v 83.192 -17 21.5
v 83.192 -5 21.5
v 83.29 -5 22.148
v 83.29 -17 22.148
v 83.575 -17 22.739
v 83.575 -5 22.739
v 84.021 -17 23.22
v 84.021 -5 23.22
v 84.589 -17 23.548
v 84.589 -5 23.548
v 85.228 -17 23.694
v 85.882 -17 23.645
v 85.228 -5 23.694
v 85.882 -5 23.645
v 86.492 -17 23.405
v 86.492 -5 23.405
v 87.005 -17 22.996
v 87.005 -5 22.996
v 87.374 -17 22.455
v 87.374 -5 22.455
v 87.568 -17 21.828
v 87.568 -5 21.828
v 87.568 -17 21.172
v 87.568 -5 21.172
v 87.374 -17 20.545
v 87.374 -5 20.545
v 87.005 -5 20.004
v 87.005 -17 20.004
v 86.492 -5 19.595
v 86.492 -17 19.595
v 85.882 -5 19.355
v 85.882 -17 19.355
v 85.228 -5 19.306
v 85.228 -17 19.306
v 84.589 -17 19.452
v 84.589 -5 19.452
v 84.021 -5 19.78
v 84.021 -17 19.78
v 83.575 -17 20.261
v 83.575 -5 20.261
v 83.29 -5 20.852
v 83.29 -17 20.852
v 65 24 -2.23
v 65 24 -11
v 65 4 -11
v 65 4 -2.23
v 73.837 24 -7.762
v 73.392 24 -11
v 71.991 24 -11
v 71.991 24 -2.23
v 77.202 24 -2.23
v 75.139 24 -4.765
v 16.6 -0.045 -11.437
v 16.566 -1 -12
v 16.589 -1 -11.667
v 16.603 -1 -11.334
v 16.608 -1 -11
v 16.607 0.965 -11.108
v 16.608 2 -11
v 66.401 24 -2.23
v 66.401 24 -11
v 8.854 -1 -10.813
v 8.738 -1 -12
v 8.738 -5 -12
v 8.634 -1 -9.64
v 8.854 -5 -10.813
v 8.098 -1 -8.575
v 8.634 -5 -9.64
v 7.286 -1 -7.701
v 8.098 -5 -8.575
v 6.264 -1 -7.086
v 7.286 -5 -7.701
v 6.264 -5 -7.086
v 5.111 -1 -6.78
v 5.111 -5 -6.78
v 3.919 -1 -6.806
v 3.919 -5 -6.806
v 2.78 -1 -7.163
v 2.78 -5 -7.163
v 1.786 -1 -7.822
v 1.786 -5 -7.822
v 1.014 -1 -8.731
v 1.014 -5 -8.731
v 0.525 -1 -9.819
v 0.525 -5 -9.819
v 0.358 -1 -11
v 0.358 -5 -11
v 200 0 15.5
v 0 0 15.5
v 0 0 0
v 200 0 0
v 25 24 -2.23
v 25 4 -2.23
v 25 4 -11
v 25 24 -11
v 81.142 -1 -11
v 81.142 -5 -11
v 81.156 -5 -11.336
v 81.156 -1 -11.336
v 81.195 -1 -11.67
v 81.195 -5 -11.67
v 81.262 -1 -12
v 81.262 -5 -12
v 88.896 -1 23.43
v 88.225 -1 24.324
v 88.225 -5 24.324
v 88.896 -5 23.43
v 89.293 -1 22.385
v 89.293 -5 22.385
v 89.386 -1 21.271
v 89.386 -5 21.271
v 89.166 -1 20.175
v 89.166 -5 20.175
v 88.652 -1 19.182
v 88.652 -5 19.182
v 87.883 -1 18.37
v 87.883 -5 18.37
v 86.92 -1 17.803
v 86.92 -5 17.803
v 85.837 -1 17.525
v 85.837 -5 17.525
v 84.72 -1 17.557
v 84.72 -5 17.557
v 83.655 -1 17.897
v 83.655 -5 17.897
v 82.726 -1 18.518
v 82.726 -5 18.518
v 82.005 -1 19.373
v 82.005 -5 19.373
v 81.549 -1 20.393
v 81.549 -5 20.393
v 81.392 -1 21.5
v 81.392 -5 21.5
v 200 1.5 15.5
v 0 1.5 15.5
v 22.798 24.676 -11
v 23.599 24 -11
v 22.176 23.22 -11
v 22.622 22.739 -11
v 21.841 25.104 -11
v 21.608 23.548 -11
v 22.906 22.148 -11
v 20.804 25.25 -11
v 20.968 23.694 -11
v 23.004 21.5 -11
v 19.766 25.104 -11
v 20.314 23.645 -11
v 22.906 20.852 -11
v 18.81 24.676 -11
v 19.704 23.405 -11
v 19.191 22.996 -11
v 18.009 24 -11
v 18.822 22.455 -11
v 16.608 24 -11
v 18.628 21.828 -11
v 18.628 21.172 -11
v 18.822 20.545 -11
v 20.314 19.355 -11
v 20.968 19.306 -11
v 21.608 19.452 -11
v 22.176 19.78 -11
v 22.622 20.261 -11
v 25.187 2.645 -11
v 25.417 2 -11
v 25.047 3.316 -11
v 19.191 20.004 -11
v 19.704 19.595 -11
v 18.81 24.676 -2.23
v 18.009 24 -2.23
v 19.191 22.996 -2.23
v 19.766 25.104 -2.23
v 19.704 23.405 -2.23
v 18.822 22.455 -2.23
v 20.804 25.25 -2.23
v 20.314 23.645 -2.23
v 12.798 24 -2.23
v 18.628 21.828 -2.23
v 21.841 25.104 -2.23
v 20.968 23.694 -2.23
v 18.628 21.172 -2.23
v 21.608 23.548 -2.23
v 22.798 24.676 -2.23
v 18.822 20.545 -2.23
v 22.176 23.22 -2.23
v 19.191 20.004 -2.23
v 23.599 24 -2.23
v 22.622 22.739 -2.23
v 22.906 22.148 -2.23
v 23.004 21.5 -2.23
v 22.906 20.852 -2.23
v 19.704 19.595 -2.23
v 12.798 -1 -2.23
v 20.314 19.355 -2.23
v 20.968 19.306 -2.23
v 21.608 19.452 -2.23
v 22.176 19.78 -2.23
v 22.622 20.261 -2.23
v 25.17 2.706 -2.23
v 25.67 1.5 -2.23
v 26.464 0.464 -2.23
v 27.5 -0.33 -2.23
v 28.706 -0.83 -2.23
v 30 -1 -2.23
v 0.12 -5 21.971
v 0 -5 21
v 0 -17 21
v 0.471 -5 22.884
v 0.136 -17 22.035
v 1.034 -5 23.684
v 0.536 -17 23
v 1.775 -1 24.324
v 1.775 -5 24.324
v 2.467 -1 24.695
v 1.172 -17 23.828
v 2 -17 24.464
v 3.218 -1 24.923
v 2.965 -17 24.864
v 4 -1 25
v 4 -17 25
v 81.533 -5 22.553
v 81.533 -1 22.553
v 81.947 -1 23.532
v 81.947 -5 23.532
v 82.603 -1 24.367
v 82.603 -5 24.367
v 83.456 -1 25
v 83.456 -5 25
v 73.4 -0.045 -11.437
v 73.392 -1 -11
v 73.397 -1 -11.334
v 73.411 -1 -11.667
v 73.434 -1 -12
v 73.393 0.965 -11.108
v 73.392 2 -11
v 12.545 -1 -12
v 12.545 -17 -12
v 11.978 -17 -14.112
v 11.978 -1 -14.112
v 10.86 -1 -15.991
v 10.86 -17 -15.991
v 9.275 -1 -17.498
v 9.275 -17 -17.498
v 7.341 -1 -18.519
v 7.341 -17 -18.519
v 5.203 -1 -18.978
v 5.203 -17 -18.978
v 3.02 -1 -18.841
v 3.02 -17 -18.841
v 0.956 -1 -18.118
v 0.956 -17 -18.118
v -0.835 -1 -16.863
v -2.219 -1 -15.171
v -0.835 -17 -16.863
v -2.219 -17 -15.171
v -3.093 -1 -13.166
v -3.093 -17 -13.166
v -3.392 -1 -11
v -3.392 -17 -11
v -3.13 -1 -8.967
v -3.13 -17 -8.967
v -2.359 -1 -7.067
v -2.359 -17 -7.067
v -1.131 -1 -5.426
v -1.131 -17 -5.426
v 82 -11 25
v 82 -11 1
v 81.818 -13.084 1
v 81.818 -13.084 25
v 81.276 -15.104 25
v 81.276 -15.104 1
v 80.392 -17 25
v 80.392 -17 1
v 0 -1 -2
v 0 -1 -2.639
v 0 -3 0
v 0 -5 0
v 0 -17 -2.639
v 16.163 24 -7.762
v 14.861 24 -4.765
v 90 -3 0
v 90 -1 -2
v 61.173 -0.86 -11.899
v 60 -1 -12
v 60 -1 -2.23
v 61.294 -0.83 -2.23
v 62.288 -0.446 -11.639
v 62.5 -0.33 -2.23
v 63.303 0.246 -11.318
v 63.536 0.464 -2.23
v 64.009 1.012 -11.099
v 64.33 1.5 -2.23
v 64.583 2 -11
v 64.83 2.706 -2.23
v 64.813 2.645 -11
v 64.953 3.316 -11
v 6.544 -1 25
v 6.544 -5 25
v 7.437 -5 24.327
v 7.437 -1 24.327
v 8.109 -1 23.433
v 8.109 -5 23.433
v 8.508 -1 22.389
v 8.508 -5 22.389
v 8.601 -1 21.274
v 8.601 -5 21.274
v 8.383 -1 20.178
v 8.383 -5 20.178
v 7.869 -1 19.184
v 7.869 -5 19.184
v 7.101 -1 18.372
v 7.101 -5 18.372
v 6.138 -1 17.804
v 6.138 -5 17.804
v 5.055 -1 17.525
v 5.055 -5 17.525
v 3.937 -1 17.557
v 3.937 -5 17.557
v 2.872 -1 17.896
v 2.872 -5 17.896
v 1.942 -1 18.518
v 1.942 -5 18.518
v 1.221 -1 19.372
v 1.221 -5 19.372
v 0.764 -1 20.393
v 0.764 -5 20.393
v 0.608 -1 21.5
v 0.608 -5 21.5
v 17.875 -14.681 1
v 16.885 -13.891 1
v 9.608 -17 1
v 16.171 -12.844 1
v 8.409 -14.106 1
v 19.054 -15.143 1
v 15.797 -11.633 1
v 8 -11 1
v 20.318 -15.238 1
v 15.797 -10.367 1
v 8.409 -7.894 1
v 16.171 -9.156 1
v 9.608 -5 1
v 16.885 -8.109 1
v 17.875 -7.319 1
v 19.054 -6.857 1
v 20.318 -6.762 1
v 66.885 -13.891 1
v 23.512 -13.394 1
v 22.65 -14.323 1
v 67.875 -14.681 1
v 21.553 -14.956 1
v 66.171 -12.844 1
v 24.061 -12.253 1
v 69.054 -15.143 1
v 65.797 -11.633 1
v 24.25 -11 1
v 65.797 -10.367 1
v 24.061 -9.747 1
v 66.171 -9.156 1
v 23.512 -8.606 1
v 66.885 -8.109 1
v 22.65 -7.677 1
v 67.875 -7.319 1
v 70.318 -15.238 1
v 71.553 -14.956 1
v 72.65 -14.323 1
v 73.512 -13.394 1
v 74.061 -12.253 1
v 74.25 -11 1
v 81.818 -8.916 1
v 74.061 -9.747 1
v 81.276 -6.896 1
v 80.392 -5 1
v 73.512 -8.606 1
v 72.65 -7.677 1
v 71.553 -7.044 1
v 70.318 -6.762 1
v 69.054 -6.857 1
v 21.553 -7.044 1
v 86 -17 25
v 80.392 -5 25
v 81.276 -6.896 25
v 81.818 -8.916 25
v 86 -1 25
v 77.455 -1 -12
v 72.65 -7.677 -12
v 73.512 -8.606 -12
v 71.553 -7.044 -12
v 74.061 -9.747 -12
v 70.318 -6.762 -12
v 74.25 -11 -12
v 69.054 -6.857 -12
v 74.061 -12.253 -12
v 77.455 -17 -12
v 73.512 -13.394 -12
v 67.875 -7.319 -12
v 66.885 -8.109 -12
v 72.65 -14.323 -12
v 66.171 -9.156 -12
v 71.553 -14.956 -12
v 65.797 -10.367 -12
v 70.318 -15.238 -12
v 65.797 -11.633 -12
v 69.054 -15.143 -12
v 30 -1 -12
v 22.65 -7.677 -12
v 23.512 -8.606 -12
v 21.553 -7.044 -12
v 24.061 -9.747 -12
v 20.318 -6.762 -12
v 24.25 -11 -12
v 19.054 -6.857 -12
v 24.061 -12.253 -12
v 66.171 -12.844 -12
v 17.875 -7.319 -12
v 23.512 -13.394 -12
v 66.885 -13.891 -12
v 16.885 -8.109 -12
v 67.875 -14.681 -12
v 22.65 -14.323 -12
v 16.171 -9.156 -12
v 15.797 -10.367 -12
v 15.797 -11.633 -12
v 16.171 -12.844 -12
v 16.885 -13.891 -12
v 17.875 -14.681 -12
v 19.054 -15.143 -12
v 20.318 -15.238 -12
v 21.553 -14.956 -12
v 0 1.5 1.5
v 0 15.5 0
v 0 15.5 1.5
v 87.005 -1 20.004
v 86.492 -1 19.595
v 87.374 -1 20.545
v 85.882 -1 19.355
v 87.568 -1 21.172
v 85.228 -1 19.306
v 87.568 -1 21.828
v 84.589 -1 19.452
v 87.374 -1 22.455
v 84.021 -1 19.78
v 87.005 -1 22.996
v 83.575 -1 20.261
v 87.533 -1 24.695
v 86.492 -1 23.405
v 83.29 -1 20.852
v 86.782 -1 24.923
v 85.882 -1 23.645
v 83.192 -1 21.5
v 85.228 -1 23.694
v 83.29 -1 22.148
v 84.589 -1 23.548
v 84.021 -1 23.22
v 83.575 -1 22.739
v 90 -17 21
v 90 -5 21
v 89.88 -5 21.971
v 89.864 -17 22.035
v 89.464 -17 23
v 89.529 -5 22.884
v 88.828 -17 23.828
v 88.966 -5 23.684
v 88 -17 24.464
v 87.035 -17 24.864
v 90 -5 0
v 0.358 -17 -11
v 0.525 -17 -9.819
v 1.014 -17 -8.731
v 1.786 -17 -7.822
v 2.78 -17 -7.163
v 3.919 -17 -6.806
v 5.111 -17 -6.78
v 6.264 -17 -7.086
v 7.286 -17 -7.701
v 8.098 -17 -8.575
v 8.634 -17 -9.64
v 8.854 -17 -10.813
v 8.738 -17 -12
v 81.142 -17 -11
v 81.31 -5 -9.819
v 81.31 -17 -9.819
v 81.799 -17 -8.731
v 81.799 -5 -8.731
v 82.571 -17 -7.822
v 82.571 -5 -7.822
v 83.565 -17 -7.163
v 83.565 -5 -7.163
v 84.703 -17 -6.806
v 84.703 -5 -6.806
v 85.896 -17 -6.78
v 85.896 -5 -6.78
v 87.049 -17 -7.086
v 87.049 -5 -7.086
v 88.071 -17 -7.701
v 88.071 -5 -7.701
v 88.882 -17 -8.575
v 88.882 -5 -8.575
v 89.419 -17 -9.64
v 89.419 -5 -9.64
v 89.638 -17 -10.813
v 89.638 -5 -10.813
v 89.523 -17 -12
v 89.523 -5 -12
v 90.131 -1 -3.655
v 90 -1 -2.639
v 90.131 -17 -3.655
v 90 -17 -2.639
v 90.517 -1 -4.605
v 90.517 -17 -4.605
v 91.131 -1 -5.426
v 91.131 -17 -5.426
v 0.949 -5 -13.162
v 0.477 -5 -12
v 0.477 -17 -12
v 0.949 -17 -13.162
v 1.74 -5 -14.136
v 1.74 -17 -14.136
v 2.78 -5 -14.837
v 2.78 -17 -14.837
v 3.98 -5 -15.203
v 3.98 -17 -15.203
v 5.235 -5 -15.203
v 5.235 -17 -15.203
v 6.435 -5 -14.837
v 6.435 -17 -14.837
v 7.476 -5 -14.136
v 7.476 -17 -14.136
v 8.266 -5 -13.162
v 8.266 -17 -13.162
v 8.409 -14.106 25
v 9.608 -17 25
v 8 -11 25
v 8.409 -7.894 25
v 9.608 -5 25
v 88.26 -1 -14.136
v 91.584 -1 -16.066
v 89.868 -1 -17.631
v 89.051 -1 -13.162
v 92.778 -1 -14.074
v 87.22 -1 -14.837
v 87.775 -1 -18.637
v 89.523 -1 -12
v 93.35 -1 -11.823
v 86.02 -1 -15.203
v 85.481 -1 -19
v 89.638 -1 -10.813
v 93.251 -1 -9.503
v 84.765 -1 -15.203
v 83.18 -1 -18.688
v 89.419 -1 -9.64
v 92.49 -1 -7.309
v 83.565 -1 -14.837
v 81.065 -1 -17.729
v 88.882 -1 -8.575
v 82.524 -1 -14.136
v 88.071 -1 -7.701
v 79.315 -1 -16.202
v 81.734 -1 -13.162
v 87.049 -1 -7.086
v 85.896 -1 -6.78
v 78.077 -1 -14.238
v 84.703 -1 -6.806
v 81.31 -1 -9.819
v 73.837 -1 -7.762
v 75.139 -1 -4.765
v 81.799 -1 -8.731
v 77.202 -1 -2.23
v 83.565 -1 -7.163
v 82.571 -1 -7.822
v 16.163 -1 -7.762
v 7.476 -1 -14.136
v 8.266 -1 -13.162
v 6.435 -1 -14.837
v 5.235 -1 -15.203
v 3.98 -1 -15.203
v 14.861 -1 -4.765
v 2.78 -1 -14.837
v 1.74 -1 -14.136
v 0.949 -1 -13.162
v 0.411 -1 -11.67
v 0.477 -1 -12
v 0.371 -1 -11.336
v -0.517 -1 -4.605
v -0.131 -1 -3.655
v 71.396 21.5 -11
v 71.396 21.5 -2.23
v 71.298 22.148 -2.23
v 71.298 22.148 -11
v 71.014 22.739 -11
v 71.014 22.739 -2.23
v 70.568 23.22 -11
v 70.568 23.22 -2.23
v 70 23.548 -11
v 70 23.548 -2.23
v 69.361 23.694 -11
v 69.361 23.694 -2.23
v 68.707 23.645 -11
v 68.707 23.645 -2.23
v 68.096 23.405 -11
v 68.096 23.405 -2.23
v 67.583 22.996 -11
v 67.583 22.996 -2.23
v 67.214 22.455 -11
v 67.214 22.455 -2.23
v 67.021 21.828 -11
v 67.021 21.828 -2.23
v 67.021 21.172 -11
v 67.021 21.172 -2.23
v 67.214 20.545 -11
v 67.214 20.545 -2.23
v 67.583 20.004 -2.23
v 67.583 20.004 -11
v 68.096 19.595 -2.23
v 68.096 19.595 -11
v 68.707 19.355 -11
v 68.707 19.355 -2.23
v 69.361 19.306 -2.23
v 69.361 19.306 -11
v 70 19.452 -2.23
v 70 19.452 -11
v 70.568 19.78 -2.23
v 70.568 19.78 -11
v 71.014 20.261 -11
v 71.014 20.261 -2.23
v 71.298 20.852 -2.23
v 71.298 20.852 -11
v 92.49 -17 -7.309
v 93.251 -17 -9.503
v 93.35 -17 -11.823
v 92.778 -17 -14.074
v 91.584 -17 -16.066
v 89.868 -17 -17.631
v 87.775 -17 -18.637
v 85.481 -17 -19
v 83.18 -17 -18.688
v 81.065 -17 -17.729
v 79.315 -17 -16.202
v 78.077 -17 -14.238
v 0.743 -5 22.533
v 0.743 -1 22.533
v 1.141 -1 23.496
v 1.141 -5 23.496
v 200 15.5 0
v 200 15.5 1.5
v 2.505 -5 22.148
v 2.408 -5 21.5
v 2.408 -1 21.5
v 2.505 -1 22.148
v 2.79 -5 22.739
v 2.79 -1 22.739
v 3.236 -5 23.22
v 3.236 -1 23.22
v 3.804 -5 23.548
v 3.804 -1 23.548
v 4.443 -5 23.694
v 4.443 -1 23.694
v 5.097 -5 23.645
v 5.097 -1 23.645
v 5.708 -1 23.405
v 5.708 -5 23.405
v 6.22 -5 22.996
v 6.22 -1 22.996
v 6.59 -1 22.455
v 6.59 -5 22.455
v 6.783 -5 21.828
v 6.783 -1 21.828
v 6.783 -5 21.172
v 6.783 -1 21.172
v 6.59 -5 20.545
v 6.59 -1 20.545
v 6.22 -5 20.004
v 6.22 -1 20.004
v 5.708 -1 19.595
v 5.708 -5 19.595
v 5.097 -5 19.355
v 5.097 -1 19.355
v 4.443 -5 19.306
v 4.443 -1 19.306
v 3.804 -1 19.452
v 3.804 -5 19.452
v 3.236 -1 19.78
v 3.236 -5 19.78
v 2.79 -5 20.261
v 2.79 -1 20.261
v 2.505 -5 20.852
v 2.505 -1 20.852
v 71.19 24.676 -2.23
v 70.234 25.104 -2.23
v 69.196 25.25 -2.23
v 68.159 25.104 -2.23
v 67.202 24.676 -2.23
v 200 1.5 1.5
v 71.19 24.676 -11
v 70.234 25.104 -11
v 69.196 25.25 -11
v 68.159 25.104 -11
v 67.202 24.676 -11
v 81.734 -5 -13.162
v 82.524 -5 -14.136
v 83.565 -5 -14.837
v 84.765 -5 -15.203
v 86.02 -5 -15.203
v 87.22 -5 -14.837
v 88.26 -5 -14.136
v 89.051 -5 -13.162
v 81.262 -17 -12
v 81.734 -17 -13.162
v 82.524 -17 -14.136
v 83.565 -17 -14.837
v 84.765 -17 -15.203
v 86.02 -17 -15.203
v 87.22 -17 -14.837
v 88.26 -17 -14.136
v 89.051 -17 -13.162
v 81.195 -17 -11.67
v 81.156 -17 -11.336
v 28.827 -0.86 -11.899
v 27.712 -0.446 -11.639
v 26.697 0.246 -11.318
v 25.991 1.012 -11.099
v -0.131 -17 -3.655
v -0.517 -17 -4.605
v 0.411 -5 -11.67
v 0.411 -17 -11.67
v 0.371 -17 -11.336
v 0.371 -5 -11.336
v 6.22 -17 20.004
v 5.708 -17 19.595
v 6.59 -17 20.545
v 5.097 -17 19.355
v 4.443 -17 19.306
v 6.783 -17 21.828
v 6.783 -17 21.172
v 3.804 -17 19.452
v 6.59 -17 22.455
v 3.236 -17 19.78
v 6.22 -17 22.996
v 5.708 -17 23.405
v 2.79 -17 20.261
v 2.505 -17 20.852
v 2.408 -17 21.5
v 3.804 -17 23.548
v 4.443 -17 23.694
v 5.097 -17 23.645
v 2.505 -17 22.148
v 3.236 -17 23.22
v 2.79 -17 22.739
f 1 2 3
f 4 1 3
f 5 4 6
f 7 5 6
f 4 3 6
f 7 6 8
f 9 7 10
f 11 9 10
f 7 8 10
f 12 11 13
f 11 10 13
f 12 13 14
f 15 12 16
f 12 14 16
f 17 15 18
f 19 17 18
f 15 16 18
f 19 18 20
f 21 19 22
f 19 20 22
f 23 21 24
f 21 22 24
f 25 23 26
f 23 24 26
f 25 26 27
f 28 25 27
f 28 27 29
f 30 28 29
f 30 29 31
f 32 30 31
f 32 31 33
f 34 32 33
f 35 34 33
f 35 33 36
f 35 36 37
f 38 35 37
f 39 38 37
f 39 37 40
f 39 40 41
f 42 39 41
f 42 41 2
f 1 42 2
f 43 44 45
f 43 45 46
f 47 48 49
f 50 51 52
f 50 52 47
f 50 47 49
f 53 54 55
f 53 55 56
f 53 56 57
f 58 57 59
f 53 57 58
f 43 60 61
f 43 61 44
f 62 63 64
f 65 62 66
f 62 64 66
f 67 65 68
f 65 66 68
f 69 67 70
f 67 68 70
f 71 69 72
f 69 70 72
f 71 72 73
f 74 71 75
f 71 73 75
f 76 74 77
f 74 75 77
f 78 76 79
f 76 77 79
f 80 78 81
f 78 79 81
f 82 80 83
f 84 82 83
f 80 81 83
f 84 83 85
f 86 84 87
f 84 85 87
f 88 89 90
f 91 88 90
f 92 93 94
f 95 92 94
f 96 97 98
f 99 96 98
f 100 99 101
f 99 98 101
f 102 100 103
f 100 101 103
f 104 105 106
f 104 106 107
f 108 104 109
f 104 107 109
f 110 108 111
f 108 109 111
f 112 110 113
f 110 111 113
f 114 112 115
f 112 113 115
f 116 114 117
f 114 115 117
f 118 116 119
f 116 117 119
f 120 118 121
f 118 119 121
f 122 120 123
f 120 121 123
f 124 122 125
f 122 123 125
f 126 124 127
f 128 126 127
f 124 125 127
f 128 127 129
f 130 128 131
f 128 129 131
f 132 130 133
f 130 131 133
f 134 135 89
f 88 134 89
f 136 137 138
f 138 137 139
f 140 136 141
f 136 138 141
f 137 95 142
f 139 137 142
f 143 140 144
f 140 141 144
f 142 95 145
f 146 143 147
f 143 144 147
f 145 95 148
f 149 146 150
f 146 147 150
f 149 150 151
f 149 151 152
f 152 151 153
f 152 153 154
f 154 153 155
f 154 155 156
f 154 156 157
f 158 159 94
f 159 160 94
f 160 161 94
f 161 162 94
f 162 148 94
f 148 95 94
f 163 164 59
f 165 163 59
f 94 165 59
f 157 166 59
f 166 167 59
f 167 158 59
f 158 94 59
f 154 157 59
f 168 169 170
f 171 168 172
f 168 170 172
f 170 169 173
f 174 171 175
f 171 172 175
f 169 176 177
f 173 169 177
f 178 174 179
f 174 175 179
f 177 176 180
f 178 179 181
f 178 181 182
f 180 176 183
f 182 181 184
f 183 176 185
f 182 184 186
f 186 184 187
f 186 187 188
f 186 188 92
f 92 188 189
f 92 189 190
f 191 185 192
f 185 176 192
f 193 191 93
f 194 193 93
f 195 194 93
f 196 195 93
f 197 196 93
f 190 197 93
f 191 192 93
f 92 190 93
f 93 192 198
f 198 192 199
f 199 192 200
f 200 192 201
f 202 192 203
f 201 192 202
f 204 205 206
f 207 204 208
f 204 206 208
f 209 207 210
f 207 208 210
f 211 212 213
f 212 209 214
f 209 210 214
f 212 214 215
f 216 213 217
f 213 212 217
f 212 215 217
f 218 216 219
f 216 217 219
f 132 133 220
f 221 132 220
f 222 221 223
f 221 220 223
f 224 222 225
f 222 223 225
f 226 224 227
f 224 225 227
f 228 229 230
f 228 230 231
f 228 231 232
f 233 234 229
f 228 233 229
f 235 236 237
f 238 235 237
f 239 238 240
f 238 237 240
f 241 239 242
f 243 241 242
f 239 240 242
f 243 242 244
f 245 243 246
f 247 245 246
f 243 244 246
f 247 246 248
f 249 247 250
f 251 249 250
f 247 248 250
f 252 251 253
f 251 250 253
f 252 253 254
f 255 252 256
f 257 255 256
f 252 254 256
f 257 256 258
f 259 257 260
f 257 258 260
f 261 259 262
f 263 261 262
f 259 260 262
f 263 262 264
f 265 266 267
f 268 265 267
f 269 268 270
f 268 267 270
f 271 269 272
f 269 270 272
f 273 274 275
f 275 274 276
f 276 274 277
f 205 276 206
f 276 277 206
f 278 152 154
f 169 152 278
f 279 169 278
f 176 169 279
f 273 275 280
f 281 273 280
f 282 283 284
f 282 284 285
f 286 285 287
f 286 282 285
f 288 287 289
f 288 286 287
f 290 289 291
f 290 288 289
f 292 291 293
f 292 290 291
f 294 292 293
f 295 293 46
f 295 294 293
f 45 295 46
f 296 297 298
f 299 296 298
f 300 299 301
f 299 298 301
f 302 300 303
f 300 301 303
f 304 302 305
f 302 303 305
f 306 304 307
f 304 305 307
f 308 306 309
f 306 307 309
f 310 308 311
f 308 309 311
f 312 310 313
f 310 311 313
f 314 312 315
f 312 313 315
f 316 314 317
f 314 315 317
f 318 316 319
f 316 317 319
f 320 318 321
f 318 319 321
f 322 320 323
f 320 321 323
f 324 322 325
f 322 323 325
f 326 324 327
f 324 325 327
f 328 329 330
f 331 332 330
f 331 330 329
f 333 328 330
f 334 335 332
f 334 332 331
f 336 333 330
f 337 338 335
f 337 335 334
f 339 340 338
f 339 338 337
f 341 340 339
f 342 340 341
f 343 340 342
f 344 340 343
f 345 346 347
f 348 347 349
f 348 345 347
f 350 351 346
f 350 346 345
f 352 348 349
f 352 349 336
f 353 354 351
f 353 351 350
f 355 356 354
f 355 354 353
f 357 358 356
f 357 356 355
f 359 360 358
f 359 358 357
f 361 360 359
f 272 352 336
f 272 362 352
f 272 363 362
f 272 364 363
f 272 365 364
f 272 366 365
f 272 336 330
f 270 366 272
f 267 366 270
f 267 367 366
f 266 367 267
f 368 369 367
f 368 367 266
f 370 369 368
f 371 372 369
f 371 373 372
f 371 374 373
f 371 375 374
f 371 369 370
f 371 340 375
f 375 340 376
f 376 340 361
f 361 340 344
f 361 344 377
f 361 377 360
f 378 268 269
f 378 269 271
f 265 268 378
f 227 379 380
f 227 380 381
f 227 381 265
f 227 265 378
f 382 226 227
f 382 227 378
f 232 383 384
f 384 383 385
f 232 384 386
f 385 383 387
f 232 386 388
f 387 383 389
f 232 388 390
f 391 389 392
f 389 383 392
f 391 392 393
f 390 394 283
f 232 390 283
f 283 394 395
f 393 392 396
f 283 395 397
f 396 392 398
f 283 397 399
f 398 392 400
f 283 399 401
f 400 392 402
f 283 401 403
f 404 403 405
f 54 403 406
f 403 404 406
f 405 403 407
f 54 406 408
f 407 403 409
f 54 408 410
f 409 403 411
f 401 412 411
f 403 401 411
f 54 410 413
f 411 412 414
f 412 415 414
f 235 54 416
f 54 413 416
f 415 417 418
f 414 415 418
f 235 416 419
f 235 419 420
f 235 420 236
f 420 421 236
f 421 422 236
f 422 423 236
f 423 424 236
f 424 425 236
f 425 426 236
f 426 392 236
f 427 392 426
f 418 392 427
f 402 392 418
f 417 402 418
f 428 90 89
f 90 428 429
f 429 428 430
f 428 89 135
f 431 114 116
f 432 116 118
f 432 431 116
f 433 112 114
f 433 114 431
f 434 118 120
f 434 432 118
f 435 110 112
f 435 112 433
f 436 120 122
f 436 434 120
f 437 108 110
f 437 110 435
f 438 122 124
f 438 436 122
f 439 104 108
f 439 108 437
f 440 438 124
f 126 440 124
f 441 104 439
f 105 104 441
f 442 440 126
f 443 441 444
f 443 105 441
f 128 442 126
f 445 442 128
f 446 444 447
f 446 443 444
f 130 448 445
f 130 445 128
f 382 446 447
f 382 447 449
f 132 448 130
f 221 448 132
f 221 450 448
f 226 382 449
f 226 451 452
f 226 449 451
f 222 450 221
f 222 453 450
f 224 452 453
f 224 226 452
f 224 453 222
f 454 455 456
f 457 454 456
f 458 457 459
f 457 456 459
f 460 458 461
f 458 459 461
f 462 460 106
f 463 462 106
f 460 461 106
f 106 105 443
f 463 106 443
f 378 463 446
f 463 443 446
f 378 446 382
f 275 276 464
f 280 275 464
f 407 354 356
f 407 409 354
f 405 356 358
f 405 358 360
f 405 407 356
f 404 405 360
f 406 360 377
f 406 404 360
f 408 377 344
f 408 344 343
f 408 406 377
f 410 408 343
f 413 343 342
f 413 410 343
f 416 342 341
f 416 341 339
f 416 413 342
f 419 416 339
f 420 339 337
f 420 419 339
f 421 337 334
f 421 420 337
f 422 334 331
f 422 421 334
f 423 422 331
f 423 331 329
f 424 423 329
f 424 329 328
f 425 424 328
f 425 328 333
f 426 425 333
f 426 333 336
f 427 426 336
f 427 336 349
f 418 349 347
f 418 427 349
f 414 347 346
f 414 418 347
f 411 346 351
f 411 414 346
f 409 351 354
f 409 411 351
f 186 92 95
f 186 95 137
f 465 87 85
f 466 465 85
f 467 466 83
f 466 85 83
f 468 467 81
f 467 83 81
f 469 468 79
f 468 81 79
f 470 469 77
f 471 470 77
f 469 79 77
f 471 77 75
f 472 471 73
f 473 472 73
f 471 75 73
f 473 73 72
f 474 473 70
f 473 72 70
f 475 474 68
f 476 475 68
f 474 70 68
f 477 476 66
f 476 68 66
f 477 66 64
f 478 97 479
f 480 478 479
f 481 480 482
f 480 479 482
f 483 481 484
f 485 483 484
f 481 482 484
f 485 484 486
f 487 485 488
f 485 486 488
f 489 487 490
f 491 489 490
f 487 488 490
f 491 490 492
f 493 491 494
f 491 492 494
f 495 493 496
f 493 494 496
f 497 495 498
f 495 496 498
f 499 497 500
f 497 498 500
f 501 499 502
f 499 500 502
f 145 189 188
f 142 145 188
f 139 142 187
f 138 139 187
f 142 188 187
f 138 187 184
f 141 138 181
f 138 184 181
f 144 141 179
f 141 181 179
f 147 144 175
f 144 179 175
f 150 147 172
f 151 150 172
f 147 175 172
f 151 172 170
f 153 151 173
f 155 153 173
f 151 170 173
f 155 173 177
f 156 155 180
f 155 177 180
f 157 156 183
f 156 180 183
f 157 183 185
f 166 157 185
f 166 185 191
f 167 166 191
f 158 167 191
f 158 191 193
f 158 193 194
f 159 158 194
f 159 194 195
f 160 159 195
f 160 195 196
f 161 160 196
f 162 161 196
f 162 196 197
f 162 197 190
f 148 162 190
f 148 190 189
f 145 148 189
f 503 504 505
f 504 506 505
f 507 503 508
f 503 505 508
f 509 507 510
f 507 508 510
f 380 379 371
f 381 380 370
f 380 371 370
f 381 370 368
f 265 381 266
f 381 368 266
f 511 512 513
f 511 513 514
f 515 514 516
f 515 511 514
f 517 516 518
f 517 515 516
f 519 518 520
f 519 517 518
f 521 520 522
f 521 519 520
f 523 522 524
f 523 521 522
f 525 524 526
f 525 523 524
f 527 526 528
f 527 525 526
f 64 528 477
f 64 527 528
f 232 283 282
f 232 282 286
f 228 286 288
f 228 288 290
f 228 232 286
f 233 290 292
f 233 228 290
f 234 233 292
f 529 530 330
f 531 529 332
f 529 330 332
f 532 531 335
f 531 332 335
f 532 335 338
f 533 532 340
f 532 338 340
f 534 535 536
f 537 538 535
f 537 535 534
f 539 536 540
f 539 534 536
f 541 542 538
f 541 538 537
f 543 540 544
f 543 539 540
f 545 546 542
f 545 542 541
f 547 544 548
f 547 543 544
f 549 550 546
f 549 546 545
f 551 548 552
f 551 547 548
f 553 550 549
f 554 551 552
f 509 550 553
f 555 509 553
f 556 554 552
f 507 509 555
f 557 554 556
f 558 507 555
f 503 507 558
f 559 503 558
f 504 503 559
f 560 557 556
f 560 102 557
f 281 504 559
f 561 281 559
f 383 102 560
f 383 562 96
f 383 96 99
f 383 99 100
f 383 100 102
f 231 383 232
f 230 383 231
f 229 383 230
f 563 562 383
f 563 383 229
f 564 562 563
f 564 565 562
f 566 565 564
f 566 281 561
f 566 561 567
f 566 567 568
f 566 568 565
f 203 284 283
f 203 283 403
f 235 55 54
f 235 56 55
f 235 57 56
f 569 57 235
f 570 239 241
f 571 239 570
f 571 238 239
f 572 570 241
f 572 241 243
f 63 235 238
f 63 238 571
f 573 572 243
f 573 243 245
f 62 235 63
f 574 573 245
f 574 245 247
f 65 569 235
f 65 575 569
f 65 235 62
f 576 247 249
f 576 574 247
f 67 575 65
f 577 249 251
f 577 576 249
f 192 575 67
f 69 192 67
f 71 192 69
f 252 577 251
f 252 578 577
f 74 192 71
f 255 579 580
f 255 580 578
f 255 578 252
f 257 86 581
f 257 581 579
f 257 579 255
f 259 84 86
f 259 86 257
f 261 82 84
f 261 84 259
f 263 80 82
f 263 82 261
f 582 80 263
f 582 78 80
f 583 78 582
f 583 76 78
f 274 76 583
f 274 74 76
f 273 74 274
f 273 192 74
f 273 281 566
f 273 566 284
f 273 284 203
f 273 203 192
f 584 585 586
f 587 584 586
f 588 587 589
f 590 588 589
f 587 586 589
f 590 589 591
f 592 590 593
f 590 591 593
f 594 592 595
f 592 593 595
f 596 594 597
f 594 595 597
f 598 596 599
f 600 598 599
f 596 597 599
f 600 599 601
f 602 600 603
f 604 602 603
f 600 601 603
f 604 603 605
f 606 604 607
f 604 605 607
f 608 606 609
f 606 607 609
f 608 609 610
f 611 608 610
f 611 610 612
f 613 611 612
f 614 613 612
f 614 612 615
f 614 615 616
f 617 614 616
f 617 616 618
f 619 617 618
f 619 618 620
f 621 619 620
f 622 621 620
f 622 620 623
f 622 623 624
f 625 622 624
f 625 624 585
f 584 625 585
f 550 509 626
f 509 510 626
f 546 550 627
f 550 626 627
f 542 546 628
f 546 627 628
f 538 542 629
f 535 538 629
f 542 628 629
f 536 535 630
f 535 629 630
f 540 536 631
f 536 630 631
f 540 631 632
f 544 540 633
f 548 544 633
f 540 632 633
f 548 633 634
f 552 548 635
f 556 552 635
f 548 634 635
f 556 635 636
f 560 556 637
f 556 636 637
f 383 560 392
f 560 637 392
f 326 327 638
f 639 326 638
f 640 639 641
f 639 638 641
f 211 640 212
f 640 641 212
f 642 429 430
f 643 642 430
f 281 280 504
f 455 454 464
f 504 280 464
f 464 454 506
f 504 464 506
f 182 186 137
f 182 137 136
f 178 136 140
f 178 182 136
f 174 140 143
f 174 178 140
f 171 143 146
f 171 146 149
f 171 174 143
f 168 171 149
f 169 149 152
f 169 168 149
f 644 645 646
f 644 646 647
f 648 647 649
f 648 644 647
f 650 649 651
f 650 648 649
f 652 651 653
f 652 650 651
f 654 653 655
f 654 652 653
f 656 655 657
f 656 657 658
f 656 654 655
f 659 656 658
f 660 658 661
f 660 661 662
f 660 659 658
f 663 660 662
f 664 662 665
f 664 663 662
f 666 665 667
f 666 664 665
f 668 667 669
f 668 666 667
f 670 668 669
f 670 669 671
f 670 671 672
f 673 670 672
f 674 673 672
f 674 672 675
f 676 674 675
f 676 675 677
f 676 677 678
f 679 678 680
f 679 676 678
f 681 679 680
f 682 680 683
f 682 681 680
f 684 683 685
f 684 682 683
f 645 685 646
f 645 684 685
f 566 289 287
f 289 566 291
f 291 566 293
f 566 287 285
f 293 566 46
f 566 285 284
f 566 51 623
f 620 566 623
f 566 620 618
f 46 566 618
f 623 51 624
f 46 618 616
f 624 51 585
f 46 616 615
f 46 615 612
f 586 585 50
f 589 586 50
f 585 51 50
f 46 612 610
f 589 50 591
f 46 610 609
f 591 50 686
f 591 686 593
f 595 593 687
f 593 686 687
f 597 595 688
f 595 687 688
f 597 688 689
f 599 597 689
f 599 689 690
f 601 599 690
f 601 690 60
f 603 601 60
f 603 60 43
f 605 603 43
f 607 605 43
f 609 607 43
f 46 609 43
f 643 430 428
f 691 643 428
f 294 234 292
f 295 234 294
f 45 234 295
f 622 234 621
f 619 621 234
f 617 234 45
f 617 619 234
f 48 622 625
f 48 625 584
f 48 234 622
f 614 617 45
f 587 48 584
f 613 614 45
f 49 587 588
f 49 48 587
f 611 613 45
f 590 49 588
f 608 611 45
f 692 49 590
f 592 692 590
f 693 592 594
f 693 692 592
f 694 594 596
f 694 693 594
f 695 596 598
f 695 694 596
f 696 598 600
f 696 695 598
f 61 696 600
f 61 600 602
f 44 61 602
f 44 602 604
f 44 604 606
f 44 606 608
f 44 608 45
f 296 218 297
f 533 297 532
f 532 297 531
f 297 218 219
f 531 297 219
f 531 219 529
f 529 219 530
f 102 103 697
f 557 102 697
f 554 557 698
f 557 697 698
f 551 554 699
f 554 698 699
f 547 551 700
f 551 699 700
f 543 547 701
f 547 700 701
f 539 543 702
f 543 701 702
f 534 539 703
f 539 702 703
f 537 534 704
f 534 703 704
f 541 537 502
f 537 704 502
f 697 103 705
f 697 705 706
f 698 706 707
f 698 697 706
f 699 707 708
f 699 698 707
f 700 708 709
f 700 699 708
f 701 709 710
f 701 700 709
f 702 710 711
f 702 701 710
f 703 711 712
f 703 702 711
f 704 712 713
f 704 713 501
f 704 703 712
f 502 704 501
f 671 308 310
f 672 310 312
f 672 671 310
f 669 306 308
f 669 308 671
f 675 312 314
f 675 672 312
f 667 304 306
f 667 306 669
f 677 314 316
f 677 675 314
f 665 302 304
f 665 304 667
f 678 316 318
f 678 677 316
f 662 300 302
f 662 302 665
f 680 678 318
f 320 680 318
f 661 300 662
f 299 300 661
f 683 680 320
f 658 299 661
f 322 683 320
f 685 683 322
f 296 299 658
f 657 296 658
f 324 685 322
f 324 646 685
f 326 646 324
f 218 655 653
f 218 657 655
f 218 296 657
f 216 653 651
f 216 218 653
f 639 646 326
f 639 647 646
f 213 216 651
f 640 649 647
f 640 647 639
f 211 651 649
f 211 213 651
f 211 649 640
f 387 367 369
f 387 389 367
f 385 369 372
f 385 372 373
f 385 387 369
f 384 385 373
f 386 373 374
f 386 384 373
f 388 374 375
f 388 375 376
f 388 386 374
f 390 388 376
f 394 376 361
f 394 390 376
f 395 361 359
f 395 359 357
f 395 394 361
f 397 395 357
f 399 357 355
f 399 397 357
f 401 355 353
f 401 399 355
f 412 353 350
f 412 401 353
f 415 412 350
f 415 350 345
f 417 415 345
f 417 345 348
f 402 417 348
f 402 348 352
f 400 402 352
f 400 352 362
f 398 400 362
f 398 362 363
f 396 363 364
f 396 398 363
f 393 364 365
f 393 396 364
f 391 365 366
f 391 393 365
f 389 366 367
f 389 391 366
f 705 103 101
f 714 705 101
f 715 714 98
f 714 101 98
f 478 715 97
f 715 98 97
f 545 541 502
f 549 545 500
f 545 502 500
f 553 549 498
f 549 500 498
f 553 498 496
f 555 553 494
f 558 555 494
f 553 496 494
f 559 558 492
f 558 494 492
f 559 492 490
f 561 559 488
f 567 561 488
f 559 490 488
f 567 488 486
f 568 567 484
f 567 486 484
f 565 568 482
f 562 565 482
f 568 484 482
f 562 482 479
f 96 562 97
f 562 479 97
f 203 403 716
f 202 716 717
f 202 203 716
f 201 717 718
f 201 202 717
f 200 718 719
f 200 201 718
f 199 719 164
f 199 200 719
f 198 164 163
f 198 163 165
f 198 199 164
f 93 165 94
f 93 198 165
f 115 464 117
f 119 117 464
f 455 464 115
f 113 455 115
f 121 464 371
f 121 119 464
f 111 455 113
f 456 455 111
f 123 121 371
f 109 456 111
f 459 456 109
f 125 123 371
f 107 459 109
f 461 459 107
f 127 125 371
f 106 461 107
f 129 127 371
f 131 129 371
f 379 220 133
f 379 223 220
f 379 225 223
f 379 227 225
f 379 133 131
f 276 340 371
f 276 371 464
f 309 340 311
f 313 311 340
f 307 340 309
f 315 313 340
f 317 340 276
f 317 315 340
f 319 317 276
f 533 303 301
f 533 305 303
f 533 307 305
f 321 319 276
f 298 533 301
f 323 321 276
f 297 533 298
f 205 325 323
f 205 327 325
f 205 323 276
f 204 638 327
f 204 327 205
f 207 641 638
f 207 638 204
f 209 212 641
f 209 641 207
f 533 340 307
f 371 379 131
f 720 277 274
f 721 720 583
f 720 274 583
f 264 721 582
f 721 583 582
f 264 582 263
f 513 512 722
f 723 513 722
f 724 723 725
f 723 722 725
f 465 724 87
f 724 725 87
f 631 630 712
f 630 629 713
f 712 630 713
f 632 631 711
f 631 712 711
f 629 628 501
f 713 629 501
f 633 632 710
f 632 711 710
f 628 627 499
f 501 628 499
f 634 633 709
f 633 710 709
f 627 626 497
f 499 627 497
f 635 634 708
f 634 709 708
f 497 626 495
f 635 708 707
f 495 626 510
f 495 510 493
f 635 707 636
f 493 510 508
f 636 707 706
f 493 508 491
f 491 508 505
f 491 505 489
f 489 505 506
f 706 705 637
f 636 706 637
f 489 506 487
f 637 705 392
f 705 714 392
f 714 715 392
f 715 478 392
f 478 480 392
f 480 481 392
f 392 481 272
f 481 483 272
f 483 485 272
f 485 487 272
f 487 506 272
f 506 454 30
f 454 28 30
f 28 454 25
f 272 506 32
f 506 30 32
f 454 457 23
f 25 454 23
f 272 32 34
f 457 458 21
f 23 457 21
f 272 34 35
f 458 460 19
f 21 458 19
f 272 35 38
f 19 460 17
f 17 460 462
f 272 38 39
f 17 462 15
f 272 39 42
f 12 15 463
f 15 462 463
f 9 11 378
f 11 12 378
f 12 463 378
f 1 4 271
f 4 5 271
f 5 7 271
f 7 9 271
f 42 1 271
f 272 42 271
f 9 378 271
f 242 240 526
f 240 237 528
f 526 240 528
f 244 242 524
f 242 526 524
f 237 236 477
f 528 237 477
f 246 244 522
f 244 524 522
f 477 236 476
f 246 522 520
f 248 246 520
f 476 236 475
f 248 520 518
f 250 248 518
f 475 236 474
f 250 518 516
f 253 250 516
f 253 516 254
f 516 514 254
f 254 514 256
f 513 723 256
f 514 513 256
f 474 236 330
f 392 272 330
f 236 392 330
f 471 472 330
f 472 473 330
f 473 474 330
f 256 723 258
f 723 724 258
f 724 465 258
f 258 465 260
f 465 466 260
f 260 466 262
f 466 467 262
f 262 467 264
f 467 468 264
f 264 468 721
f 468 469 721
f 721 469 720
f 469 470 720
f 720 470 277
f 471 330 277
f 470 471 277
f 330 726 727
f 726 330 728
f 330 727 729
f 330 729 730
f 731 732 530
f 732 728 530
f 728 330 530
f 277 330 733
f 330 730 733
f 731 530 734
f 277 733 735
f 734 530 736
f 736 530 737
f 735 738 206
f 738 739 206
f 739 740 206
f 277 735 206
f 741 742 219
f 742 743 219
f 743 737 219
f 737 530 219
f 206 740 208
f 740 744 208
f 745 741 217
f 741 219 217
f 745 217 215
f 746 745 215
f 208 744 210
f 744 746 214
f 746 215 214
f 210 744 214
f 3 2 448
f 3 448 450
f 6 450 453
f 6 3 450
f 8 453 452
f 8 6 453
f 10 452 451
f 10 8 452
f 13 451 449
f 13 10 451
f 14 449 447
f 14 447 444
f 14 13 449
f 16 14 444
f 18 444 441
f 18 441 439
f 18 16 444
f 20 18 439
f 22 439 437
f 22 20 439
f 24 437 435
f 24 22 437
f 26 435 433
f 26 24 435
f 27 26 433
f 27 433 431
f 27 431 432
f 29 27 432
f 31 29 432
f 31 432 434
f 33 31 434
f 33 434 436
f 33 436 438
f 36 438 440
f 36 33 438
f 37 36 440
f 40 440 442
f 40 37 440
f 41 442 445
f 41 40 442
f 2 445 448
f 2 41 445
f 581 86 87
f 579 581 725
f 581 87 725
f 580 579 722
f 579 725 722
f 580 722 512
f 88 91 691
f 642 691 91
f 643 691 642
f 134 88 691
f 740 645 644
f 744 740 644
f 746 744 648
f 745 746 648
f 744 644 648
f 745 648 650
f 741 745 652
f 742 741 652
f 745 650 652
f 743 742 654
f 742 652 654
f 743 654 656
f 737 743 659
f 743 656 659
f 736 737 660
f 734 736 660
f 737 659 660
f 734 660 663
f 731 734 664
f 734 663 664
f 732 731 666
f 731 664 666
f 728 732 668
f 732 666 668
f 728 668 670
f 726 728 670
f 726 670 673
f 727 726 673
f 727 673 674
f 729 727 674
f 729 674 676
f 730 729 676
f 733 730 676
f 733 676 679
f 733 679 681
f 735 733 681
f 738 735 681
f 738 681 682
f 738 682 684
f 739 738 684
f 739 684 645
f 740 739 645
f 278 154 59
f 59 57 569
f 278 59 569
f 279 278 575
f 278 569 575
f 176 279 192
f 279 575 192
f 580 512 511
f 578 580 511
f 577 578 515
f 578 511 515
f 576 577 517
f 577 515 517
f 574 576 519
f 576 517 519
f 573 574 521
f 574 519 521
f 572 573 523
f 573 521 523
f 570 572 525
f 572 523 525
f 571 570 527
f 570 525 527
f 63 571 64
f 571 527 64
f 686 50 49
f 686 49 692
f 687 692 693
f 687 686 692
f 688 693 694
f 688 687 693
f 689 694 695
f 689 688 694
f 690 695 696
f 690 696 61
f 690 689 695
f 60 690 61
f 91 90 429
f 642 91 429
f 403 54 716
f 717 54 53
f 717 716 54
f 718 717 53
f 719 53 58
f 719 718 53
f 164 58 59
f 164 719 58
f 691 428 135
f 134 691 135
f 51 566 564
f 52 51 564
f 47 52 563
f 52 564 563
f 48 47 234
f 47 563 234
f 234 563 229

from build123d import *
from build123d import SkipClean  # not in build123d's __all__

# Parameters (mm, degrees)
F1_DEPTH      = 200
F2_R          = 4.25
F3_DEPTH      = 12
F3_DEPTH_BACK = 1
F4_DEPTH      = 25
F5_R          = 2.2
F6_DEPTH      = 25
F7_DEPTH      = 4
F8_DEPTH      = 12
F9_DEPTH      = 25
F10_DEPTH     = 4
F12_DEPTH     = 25
F14_DEPTH     = 8.7699061669
F13_R         = 2.2
F15_DEPTH     = 25
F16_T1_DEPTH  = 8.7699061669
F16_T6_DEPTH  = 15.8923048454
F16_S7_R      = 12
F16_T8_DEPTH  = 10
F16_T12_DEPTH = 15.8923048454
F16_S13_R     = 12
F16_T14_DEPTH = 10
F16_T19_DEPTH = 23.3923048454
F16_T23_DEPTH = 21.2699061669
F16_T31_DEPTH = 21.2699061669
F16_T36_DEPTH = 23.3923048454
F17_SIZE      = 2
F18_R         = 4


# Not quite as in the source:
# - a fillet or chamfer that OpenCascade refuses, or shapes differently, is made with other operations: its cross-section is extruded or revolved along the edge and cut away or added


with BuildPart() as f1:
    # F0 (on Right) → F1 (new body)
    with BuildSketch(Plane.YZ):
        Polygon((0, 15.5), (0, 0), (15.5, 0), (15.5, 1.5), (1.5, 1.5), (1.5, 15.5), align=None)
    extrude(amount=F1_DEPTH)


with BuildPart() as f3:
    # F2 (on Top) → F3 (new body, two sides)
    with BuildSketch(Plane.XY) as f3_sk:
        with BuildLine():
            Line((9.6076951546, -5), (0, -5))
            Line((0, -5), (0, -17))
            Line((0, -17), (9.6076951546, -17))
            ThreePointArc((9.6076951546, -17), (8, -11), (9.6076951546, -5))
        make_face()
        with BuildLine():
            Line((59.6076951546, -5), (30.3923048454, -5))
            ThreePointArc((30.3923048454, -5), (31.5911099155, -7.8941714588), (32, -11))
            ThreePointArc((32, -11), (31.5911099155, -14.1058285412), (30.3923048454, -17))
            Line((30.3923048454, -17), (59.6076951546, -17))
            ThreePointArc((59.6076951546, -17), (58, -11), (59.6076951546, -5))
        make_face()
        with BuildLine():
            Line((90, -5), (80.3923048454, -5))
            ThreePointArc((80.3923048454, -5), (81.5911099155, -7.8941714588), (82, -11))
            ThreePointArc((82, -11), (81.5911099155, -14.1058285412), (80.3923048454, -17))
            Line((80.3923048454, -17), (90, -17))
            Line((90, -17), (90, -5))
        make_face()
        with BuildLine():
            Line((30.3923048454, -5), (9.6076951546, -5))
            ThreePointArc((9.6076951546, -5), (8, -11), (9.6076951546, -17))
            Line((9.6076951546, -17), (30.3923048454, -17))
            ThreePointArc((30.3923048454, -17), (31.5911099155, -14.1058285412), (32, -11))
            ThreePointArc((32, -11), (31.5911099155, -7.8941714588), (30.3923048454, -5))
        make_face()
        with Locations((20, -11)):
            Circle(F2_R, mode=Mode.SUBTRACT)
        with BuildLine():
            Line((80.3923048454, -5), (59.6076951546, -5))
            ThreePointArc((59.6076951546, -5), (58, -11), (59.6076951546, -17))
            Line((59.6076951546, -17), (80.3923048454, -17))
            ThreePointArc((80.3923048454, -17), (81.5911099155, -14.1058285412), (82, -11))
            ThreePointArc((82, -11), (81.5911099155, -7.8941714588), (80.3923048454, -5))
        make_face()
        with Locations((70, -11)):
            Circle(F2_R, mode=Mode.SUBTRACT)
    extrude(amount=-F3_DEPTH)
    extrude(f3_sk.sketch, amount=F3_DEPTH_BACK)

    # F2 (on Top) → F4 (join)
    with BuildSketch(Plane.XY):
        with BuildLine():
            Line((9.6076951546, -5), (0, -5))
            Line((0, -5), (0, -17))
            Line((0, -17), (9.6076951546, -17))
            ThreePointArc((9.6076951546, -17), (8, -11), (9.6076951546, -5))
        make_face()
        with BuildLine():
            Line((90, -5), (80.3923048454, -5))
            ThreePointArc((80.3923048454, -5), (81.5911099155, -7.8941714588), (82, -11))
            ThreePointArc((82, -11), (81.5911099155, -14.1058285412), (80.3923048454, -17))
            Line((80.3923048454, -17), (90, -17))
            Line((90, -17), (90, -5))
        make_face()
    extrude(amount=F4_DEPTH)

    # F5 (on face) → F6 (cut)
    with BuildSketch(Plane(origin=(0, -5, 0), x_dir=(-1, 0, 0), z_dir=(0, 1, 0))):
        with Locations((-4.6076951546, 21.5)):
            Circle(F5_R)
        with Locations((-85.3923048454, 21.5)):
            Circle(F5_R)
    extrude(amount=-F6_DEPTH, mode=Mode.SUBTRACT)

    # F5 (on face) → F7 (join)
    with BuildSketch(Plane(origin=(0, -5, 0), x_dir=(-1, 0, 0), z_dir=(0, 1, 0))):
        with BuildLine():
            ThreePointArc((-0.6076951546, 21.5), (-1.1619755859, 23.5315060063), (-2.6712034815, 25))
            Line((-2.6712034815, 25), (-6.5441868277, 25))
            ThreePointArc((-6.5441868277, 25), (-6.6392011609, 18.0542804313), (-0.6076951546, 21.5))
        make_face()
        with Locations((-4.6076951546, 21.5)):
            Circle(F5_R, mode=Mode.SUBTRACT)
        with BuildLine():
            ThreePointArc((-81.3923048454, 21.5), (-81.9465852767, 23.5315060063), (-83.4558131723, 25))
            Line((-83.4558131723, 25), (-87.3287965185, 25))
            ThreePointArc((-87.3287965185, 25), (-87.4238108518, 18.0542804313), (-81.3923048454, 21.5))
        make_face()
        with Locations((-85.3923048454, 21.5)):
            Circle(F5_R, mode=Mode.SUBTRACT)
    extrude(amount=F7_DEPTH)

    # F5 (on face) → F8 (join, through all)
    with BuildSketch(Plane(origin=(0, -5, 0), x_dir=(-1, 0, 0), z_dir=(0, 1, 0))):
        with BuildLine():
            ThreePointArc((3.3923048454, -11), (2.4937681185, -7.3163578646), (0, -4.4601876661))
            Line((0, -4.4601876661), (0, -12))
            Line((0, -12), (-0.4770172441, -12))
            ThreePointArc((-0.4770172441, -12), (-4.6076951546, -15.25), (-8.7383730651, -12))
            Line((-8.7383730651, -12), (-12.5449490878, -12))
            ThreePointArc((-12.5449490878, -12), (-4.1067118542, -18.9842980739), (3.3923048454, -11))
        make_face()
        with BuildLine():
            Line((-90, -12), (-90, -4.4601876661))
            ThreePointArc((-90, -4.4601876661), (-89.5134312597, -17.8568445423), (-77.4550509122, -12))
            Line((-77.4550509122, -12), (-81.2616269349, -12))
            ThreePointArc((-81.2616269349, -12), (-85.3923048454, -15.25), (-89.5229827559, -12))
            Line((-89.5229827559, -12), (-90, -12))
        make_face()
        with BuildLine():
            ThreePointArc((-77.3923048454, -11), (-81.70866271, -3.898536727), (-90, -4.4601876661))
            Line((-90, -4.4601876661), (-90, -12))
            Line((-90, -12), (-89.5229827559, -12))
            ThreePointArc((-89.5229827559, -12), (-85.8958517055, -6.7799359531), (-81.1423048454, -11))
            ThreePointArc((-81.1423048454, -11), (-81.1722407985, -11.50354686), (-81.2616269349, -12))
            Line((-81.2616269349, -12), (-77.4550509122, -12))
            ThreePointArc((-77.4550509122, -12), (-77.4080067715, -11.5009833003), (-77.3923048454, -11))
        make_face()
    extrude(amount=-F8_DEPTH)

    # F5 (on face) → F9 (cut)
    with BuildSketch(Plane(origin=(0, -5, 0), x_dir=(-1, 0, 0), z_dir=(0, 1, 0))):
        with BuildLine():
            Line((-89.5229827559, -12), (-81.2616269349, -12))
            ThreePointArc((-81.2616269349, -12), (-81.1722407985, -11.50354686), (-81.1423048454, -11))
            ThreePointArc((-81.1423048454, -11), (-85.8958517055, -6.7799359531), (-89.5229827559, -12))
        make_face()
        with BuildLine():
            ThreePointArc((-0.3576951546, -11), (-5.1112420146, -6.7799359531), (-8.7383730651, -12))
            Line((-8.7383730651, -12), (-0.4770172441, -12))
            ThreePointArc((-0.4770172441, -12), (-0.3876311077, -11.50354686), (-0.3576951546, -11))
        make_face()
    with SkipClean():  # cleaning this boolean's faces spoils the solid; the shape is the same uncleaned
        extrude(amount=-F9_DEPTH, mode=Mode.SUBTRACT)

    # F5 (on face) → F10 (join)
    with BuildSketch(Plane(origin=(0, -5, 0), x_dir=(-1, 0, 0), z_dir=(0, 1, 0))):
        with BuildLine():
            Line((0, -4.4601876661), (0, 0))
            Line((0, 0), (-90, 0))
            Line((-90, 0), (-90, -4.4601876661))
            ThreePointArc((-90, -4.4601876661), (-81.70866271, -3.898536727), (-77.3923048454, -11))
            ThreePointArc((-77.3923048454, -11), (-77.4080067715, -11.5009833003), (-77.4550509122, -12))
            Line((-77.4550509122, -12), (-12.5449490878, -12))
            ThreePointArc((-12.5449490878, -12), (-8.7288215689, -4.1431554577), (0, -4.4601876661))
        make_face()
        with BuildLine():
            ThreePointArc((-77.3923048454, -11), (-81.70866271, -3.898536727), (-90, -4.4601876661))
            Line((-90, -4.4601876661), (-90, -12))
            Line((-90, -12), (-89.5229827559, -12))
            ThreePointArc((-89.5229827559, -12), (-85.8958517055, -6.7799359531), (-81.1423048454, -11))
            ThreePointArc((-81.1423048454, -11), (-81.1722407985, -11.50354686), (-81.2616269349, -12))
            Line((-81.2616269349, -12), (-77.4550509122, -12))
            ThreePointArc((-77.4550509122, -12), (-77.4080067715, -11.5009833003), (-77.3923048454, -11))
        make_face()
        with BuildLine():
            Line((-90, -12), (-90, -4.4601876661))
            ThreePointArc((-90, -4.4601876661), (-89.5134312597, -17.8568445423), (-77.4550509122, -12))
            Line((-77.4550509122, -12), (-81.2616269349, -12))
            ThreePointArc((-81.2616269349, -12), (-85.3923048454, -15.25), (-89.5229827559, -12))
            Line((-89.5229827559, -12), (-90, -12))
        make_face()
        with BuildLine():
            Line((0, -12), (0, -4.4601876661))
            ThreePointArc((0, -4.4601876661), (-8.7288215689, -4.1431554577), (-12.5449490878, -12))
            Line((-12.5449490878, -12), (-8.7383730651, -12))
            ThreePointArc((-8.7383730651, -12), (-5.1112420146, -6.7799359531), (-0.3576951546, -11))
            ThreePointArc((-0.3576951546, -11), (-0.3876311077, -11.50354686), (-0.4770172441, -12))
            Line((-0.4770172441, -12), (0, -12))
        make_face()
        with BuildLine():
            ThreePointArc((3.3923048454, -11), (2.4937681185, -7.3163578646), (0, -4.4601876661))
            Line((0, -4.4601876661), (0, -12))
            Line((0, -12), (-0.4770172441, -12))
            ThreePointArc((-0.4770172441, -12), (-4.6076951546, -15.25), (-8.7383730651, -12))
            Line((-8.7383730651, -12), (-12.5449490878, -12))
            ThreePointArc((-12.5449490878, -12), (-4.1067118542, -18.9842980739), (3.3923048454, -11))
        make_face()
    with SkipClean():  # cleaning this boolean's faces spoils the solid; the shape is the same uncleaned
        extrude(amount=F10_DEPTH)

    # F11 (on face) → F12 (join)
    with BuildSketch(Plane(origin=(0, -1, 0), x_dir=(-1, 0, 0), z_dir=(0, 1, 0))):
        with BuildLine():
            ThreePointArc((-77.2015328535, -2.2300938331), (-74.3857326292, -6.2192711802), (-73.3923048454, -11))
            Line((-73.3923048454, -11), (-65, -11))
            Line((-65, -11), (-65, -2.2300938331))
            Line((-65, -2.2300938331), (-77.2015328535, -2.2300938331))
        make_face()
        with BuildLine():
            Line((-25, -2.2300938331), (-25, -11))
            Line((-25, -11), (-16.6076951546, -11))
            ThreePointArc((-16.6076951546, -11), (-15.6142673708, -6.2192711802), (-12.7984671465, -2.2300938331))
            Line((-12.7984671465, -2.2300938331), (-25, -2.2300938331))
        make_face()
    extrude(amount=F12_DEPTH)

    # F13 (on face) → F14 (join, through all)
    with BuildSketch(Plane.XY.offset(-2.2300938331)):
        with BuildLine():
            Line((65, 15.5), (73.3923048454, 15.5))
            Line((73.3923048454, 15.5), (73.3923048454, 24))
            Line((73.3923048454, 24), (71.9912373946, 24))
            ThreePointArc((71.9912373946, 24), (72.6992987688, 22.8380828366), (72.9461524227, 21.5))
            ThreePointArc((72.9461524227, 21.5), (67.8580695861, 17.9968536539), (66.4010674508, 24))
            Line((66.4010674508, 24), (65, 24))
            Line((65, 24), (65, 15.5))
        make_face()
        with BuildLine():
            Line((66.4010674508, 24), (71.9912373946, 24))
            ThreePointArc((71.9912373946, 24), (69.1961524227, 25.25), (66.4010674508, 24))
        make_face()
        with BuildLine():
            Line((18.0087626054, 24), (23.5989325492, 24))
            ThreePointArc((23.5989325492, 24), (20.8038475773, 25.25), (18.0087626054, 24))
        make_face()
    extrude(amount=-F14_DEPTH)

    # F13 (on face) → F15 (cut)
    with BuildSketch(Plane.XY.offset(-2.2300938331)):
        with Locations((20.8038475773, 21.5)):
            Circle(F13_R)
        with Locations((69.1961524227, 21.5)):
            Circle(F13_R)
    extrude(amount=-F15_DEPTH, mode=Mode.SUBTRACT)

    # F16: fillet of radius 5 on 4 edges, made by hand

    # F16_s2 → F16_t1 (join)
    with BuildSketch(Plane.XY.offset(-11)):
        with BuildLine():
            ThreePointArc((60, -1), (63.5355339059, 0.4644660941), (65, 4))
            Line((65, 4), (65, -1))
            Line((65, -1), (60, -1))
        make_face()
        with BuildLine():
            ThreePointArc((30, -1), (26.4644660941, 0.4644660941), (25, 4))
            Line((25, 4), (25, -1))
            Line((25, -1), (30, -1))
        make_face()
    extrude(amount=F16_T1_DEPTH)


with BuildPart() as f16_tool4:
    # F16_s5 → F16_t6 (new body)
    with BuildSketch(Plane.YZ.offset(80.8923048454)):
        with BuildLine():
            ThreePointArc((-1, -12), (0.4188611699, -11.2565835097), (2, -11))
            Line((2, -11), (-1, -11))
            Line((-1, -11), (-1, -12))
        make_face()
    extrude(amount=-F16_T6_DEPTH)

    # F16_s7 → F16_t8 (cut, symmetric)
    with BuildSketch(Plane.XZ.offset(-0.5)):
        with Locations((85.3923048454, -11)):
            Circle(F16_S7_R)
    extrude(amount=F16_T8_DEPTH, both=True, mode=Mode.SUBTRACT)


with BuildPart() as f3_1:
    add(f3.part, clean=False)

    # F16_t3: union F16_tool4
    add(f16_tool4.part)


with BuildPart() as f16_tool10:
    # F16_s11 → F16_t12 (new body)
    with BuildSketch(Plane.YZ.offset(25)):
        with BuildLine():
            ThreePointArc((-1, -12), (0.4188611699, -11.2565835097), (2, -11))
            Line((2, -11), (-1, -11))
            Line((-1, -11), (-1, -12))
        make_face()
    extrude(amount=-F16_T12_DEPTH)

    # F16_s13 → F16_t14 (cut, symmetric)
    with BuildSketch(Plane.XZ.offset(-0.5)):
        with Locations((4.6076951546, -11)):
            Circle(F16_S13_R)
    extrude(amount=F16_T14_DEPTH, both=True, mode=Mode.SUBTRACT)


with BuildPart() as f3_2:
    add(f3_1.part, clean=False)

    # F16_t9: union F16_tool10
    add(f16_tool10.part)


with BuildPart() as f16_tool17:
    # F16_s18 → F16_t19 (new body)
    with BuildSketch(Plane.YZ.offset(80.8923048454)):
        with BuildLine():
            ThreePointArc((-1, -12), (0.4188611699, -11.2565835097), (2, -11))
            Line((2, -11), (-1, -11))
            Line((-1, -11), (-1, -12))
        make_face()
    extrude(amount=-F16_T19_DEPTH)

    split(bisect_by=Plane.YZ.offset(65), keep=Keep.BOTTOM)


with BuildPart() as f16_tool21:
    # F16_s22 → F16_t23 (new body)
    with BuildSketch(Plane.XY.offset(-23.5)):
        with BuildLine():
            ThreePointArc((60, -1), (63.5355339059, 0.4644660941), (65, 4))
            Line((65, 4), (65, -1))
            Line((65, -1), (60, -1))
        make_face()
    extrude(amount=F16_T23_DEPTH)

    split(bisect_by=Plane.XY.offset(-12), keep=Keep.TOP)

    split(bisect_by=Plane.XY.offset(-11), keep=Keep.BOTTOM)


with BuildPart() as f16_tool17_1:
    add(f16_tool17.part, clean=False)

    # F16_t26: intersect F16_tool21
    add(f16_tool21.part, mode=Mode.INTERSECT)


with BuildPart() as f3_3:
    add(f3_2.part, clean=False)

    # F16_t15: union F16_tool17
    add(f16_tool17_1.part)


with BuildPart() as f16_tool29:
    # F16_s30 → F16_t31 (new body)
    with BuildSketch(Plane.XY.offset(-2.2300938331)):
        with BuildLine():
            ThreePointArc((30, -1), (26.4644660941, 0.4644660941), (25, 4))
            Line((25, 4), (25, -1))
            Line((25, -1), (30, -1))
        make_face()
    extrude(amount=-F16_T31_DEPTH)

    split(bisect_by=Plane.XY.offset(-12), keep=Keep.TOP)

    split(bisect_by=Plane.XY.offset(-11), keep=Keep.BOTTOM)


with BuildPart() as f16_tool34:
    # F16_s35 → F16_t36 (new body)
    with BuildSketch(Plane.YZ.offset(32.5)):
        with BuildLine():
            ThreePointArc((-1, -12), (0.4188611699, -11.2565835097), (2, -11))
            Line((2, -11), (-1, -11))
            Line((-1, -11), (-1, -12))
        make_face()
    extrude(amount=-F16_T36_DEPTH)

    split(bisect_by=Plane.YZ.offset(25), keep=Keep.TOP)


with BuildPart() as f16_tool29_1:
    add(f16_tool29.part, clean=False)

    # F16_t38: intersect F16_tool34
    add(f16_tool34.part, mode=Mode.INTERSECT)


with BuildPart() as f3_4:
    add(f3_3.part, clean=False)

    # F16_t27: union F16_tool29
    add(f16_tool29_1.part)

    # F17
    f17_edges = [f3_4.edges().sort_by_distance(p)[0] for p in [
        (45, -1, 0),
    ]]
    chamfer(f17_edges, length=F17_SIZE)

    # F18
    f18_edges = [f3_4.edges().sort_by_distance(p)[0] for p in [
        (0, -11, -4.460188),
        (0, -3, -4.460188),
        (90, -3, -4.460188),
        (90, -11, 25),
        (0, -11, 25),
        (90, -11, -4.460188),
    ]]
    fillet(f18_edges, radius=F18_R)


solid = Compound([f1.part, f3_4.part])
